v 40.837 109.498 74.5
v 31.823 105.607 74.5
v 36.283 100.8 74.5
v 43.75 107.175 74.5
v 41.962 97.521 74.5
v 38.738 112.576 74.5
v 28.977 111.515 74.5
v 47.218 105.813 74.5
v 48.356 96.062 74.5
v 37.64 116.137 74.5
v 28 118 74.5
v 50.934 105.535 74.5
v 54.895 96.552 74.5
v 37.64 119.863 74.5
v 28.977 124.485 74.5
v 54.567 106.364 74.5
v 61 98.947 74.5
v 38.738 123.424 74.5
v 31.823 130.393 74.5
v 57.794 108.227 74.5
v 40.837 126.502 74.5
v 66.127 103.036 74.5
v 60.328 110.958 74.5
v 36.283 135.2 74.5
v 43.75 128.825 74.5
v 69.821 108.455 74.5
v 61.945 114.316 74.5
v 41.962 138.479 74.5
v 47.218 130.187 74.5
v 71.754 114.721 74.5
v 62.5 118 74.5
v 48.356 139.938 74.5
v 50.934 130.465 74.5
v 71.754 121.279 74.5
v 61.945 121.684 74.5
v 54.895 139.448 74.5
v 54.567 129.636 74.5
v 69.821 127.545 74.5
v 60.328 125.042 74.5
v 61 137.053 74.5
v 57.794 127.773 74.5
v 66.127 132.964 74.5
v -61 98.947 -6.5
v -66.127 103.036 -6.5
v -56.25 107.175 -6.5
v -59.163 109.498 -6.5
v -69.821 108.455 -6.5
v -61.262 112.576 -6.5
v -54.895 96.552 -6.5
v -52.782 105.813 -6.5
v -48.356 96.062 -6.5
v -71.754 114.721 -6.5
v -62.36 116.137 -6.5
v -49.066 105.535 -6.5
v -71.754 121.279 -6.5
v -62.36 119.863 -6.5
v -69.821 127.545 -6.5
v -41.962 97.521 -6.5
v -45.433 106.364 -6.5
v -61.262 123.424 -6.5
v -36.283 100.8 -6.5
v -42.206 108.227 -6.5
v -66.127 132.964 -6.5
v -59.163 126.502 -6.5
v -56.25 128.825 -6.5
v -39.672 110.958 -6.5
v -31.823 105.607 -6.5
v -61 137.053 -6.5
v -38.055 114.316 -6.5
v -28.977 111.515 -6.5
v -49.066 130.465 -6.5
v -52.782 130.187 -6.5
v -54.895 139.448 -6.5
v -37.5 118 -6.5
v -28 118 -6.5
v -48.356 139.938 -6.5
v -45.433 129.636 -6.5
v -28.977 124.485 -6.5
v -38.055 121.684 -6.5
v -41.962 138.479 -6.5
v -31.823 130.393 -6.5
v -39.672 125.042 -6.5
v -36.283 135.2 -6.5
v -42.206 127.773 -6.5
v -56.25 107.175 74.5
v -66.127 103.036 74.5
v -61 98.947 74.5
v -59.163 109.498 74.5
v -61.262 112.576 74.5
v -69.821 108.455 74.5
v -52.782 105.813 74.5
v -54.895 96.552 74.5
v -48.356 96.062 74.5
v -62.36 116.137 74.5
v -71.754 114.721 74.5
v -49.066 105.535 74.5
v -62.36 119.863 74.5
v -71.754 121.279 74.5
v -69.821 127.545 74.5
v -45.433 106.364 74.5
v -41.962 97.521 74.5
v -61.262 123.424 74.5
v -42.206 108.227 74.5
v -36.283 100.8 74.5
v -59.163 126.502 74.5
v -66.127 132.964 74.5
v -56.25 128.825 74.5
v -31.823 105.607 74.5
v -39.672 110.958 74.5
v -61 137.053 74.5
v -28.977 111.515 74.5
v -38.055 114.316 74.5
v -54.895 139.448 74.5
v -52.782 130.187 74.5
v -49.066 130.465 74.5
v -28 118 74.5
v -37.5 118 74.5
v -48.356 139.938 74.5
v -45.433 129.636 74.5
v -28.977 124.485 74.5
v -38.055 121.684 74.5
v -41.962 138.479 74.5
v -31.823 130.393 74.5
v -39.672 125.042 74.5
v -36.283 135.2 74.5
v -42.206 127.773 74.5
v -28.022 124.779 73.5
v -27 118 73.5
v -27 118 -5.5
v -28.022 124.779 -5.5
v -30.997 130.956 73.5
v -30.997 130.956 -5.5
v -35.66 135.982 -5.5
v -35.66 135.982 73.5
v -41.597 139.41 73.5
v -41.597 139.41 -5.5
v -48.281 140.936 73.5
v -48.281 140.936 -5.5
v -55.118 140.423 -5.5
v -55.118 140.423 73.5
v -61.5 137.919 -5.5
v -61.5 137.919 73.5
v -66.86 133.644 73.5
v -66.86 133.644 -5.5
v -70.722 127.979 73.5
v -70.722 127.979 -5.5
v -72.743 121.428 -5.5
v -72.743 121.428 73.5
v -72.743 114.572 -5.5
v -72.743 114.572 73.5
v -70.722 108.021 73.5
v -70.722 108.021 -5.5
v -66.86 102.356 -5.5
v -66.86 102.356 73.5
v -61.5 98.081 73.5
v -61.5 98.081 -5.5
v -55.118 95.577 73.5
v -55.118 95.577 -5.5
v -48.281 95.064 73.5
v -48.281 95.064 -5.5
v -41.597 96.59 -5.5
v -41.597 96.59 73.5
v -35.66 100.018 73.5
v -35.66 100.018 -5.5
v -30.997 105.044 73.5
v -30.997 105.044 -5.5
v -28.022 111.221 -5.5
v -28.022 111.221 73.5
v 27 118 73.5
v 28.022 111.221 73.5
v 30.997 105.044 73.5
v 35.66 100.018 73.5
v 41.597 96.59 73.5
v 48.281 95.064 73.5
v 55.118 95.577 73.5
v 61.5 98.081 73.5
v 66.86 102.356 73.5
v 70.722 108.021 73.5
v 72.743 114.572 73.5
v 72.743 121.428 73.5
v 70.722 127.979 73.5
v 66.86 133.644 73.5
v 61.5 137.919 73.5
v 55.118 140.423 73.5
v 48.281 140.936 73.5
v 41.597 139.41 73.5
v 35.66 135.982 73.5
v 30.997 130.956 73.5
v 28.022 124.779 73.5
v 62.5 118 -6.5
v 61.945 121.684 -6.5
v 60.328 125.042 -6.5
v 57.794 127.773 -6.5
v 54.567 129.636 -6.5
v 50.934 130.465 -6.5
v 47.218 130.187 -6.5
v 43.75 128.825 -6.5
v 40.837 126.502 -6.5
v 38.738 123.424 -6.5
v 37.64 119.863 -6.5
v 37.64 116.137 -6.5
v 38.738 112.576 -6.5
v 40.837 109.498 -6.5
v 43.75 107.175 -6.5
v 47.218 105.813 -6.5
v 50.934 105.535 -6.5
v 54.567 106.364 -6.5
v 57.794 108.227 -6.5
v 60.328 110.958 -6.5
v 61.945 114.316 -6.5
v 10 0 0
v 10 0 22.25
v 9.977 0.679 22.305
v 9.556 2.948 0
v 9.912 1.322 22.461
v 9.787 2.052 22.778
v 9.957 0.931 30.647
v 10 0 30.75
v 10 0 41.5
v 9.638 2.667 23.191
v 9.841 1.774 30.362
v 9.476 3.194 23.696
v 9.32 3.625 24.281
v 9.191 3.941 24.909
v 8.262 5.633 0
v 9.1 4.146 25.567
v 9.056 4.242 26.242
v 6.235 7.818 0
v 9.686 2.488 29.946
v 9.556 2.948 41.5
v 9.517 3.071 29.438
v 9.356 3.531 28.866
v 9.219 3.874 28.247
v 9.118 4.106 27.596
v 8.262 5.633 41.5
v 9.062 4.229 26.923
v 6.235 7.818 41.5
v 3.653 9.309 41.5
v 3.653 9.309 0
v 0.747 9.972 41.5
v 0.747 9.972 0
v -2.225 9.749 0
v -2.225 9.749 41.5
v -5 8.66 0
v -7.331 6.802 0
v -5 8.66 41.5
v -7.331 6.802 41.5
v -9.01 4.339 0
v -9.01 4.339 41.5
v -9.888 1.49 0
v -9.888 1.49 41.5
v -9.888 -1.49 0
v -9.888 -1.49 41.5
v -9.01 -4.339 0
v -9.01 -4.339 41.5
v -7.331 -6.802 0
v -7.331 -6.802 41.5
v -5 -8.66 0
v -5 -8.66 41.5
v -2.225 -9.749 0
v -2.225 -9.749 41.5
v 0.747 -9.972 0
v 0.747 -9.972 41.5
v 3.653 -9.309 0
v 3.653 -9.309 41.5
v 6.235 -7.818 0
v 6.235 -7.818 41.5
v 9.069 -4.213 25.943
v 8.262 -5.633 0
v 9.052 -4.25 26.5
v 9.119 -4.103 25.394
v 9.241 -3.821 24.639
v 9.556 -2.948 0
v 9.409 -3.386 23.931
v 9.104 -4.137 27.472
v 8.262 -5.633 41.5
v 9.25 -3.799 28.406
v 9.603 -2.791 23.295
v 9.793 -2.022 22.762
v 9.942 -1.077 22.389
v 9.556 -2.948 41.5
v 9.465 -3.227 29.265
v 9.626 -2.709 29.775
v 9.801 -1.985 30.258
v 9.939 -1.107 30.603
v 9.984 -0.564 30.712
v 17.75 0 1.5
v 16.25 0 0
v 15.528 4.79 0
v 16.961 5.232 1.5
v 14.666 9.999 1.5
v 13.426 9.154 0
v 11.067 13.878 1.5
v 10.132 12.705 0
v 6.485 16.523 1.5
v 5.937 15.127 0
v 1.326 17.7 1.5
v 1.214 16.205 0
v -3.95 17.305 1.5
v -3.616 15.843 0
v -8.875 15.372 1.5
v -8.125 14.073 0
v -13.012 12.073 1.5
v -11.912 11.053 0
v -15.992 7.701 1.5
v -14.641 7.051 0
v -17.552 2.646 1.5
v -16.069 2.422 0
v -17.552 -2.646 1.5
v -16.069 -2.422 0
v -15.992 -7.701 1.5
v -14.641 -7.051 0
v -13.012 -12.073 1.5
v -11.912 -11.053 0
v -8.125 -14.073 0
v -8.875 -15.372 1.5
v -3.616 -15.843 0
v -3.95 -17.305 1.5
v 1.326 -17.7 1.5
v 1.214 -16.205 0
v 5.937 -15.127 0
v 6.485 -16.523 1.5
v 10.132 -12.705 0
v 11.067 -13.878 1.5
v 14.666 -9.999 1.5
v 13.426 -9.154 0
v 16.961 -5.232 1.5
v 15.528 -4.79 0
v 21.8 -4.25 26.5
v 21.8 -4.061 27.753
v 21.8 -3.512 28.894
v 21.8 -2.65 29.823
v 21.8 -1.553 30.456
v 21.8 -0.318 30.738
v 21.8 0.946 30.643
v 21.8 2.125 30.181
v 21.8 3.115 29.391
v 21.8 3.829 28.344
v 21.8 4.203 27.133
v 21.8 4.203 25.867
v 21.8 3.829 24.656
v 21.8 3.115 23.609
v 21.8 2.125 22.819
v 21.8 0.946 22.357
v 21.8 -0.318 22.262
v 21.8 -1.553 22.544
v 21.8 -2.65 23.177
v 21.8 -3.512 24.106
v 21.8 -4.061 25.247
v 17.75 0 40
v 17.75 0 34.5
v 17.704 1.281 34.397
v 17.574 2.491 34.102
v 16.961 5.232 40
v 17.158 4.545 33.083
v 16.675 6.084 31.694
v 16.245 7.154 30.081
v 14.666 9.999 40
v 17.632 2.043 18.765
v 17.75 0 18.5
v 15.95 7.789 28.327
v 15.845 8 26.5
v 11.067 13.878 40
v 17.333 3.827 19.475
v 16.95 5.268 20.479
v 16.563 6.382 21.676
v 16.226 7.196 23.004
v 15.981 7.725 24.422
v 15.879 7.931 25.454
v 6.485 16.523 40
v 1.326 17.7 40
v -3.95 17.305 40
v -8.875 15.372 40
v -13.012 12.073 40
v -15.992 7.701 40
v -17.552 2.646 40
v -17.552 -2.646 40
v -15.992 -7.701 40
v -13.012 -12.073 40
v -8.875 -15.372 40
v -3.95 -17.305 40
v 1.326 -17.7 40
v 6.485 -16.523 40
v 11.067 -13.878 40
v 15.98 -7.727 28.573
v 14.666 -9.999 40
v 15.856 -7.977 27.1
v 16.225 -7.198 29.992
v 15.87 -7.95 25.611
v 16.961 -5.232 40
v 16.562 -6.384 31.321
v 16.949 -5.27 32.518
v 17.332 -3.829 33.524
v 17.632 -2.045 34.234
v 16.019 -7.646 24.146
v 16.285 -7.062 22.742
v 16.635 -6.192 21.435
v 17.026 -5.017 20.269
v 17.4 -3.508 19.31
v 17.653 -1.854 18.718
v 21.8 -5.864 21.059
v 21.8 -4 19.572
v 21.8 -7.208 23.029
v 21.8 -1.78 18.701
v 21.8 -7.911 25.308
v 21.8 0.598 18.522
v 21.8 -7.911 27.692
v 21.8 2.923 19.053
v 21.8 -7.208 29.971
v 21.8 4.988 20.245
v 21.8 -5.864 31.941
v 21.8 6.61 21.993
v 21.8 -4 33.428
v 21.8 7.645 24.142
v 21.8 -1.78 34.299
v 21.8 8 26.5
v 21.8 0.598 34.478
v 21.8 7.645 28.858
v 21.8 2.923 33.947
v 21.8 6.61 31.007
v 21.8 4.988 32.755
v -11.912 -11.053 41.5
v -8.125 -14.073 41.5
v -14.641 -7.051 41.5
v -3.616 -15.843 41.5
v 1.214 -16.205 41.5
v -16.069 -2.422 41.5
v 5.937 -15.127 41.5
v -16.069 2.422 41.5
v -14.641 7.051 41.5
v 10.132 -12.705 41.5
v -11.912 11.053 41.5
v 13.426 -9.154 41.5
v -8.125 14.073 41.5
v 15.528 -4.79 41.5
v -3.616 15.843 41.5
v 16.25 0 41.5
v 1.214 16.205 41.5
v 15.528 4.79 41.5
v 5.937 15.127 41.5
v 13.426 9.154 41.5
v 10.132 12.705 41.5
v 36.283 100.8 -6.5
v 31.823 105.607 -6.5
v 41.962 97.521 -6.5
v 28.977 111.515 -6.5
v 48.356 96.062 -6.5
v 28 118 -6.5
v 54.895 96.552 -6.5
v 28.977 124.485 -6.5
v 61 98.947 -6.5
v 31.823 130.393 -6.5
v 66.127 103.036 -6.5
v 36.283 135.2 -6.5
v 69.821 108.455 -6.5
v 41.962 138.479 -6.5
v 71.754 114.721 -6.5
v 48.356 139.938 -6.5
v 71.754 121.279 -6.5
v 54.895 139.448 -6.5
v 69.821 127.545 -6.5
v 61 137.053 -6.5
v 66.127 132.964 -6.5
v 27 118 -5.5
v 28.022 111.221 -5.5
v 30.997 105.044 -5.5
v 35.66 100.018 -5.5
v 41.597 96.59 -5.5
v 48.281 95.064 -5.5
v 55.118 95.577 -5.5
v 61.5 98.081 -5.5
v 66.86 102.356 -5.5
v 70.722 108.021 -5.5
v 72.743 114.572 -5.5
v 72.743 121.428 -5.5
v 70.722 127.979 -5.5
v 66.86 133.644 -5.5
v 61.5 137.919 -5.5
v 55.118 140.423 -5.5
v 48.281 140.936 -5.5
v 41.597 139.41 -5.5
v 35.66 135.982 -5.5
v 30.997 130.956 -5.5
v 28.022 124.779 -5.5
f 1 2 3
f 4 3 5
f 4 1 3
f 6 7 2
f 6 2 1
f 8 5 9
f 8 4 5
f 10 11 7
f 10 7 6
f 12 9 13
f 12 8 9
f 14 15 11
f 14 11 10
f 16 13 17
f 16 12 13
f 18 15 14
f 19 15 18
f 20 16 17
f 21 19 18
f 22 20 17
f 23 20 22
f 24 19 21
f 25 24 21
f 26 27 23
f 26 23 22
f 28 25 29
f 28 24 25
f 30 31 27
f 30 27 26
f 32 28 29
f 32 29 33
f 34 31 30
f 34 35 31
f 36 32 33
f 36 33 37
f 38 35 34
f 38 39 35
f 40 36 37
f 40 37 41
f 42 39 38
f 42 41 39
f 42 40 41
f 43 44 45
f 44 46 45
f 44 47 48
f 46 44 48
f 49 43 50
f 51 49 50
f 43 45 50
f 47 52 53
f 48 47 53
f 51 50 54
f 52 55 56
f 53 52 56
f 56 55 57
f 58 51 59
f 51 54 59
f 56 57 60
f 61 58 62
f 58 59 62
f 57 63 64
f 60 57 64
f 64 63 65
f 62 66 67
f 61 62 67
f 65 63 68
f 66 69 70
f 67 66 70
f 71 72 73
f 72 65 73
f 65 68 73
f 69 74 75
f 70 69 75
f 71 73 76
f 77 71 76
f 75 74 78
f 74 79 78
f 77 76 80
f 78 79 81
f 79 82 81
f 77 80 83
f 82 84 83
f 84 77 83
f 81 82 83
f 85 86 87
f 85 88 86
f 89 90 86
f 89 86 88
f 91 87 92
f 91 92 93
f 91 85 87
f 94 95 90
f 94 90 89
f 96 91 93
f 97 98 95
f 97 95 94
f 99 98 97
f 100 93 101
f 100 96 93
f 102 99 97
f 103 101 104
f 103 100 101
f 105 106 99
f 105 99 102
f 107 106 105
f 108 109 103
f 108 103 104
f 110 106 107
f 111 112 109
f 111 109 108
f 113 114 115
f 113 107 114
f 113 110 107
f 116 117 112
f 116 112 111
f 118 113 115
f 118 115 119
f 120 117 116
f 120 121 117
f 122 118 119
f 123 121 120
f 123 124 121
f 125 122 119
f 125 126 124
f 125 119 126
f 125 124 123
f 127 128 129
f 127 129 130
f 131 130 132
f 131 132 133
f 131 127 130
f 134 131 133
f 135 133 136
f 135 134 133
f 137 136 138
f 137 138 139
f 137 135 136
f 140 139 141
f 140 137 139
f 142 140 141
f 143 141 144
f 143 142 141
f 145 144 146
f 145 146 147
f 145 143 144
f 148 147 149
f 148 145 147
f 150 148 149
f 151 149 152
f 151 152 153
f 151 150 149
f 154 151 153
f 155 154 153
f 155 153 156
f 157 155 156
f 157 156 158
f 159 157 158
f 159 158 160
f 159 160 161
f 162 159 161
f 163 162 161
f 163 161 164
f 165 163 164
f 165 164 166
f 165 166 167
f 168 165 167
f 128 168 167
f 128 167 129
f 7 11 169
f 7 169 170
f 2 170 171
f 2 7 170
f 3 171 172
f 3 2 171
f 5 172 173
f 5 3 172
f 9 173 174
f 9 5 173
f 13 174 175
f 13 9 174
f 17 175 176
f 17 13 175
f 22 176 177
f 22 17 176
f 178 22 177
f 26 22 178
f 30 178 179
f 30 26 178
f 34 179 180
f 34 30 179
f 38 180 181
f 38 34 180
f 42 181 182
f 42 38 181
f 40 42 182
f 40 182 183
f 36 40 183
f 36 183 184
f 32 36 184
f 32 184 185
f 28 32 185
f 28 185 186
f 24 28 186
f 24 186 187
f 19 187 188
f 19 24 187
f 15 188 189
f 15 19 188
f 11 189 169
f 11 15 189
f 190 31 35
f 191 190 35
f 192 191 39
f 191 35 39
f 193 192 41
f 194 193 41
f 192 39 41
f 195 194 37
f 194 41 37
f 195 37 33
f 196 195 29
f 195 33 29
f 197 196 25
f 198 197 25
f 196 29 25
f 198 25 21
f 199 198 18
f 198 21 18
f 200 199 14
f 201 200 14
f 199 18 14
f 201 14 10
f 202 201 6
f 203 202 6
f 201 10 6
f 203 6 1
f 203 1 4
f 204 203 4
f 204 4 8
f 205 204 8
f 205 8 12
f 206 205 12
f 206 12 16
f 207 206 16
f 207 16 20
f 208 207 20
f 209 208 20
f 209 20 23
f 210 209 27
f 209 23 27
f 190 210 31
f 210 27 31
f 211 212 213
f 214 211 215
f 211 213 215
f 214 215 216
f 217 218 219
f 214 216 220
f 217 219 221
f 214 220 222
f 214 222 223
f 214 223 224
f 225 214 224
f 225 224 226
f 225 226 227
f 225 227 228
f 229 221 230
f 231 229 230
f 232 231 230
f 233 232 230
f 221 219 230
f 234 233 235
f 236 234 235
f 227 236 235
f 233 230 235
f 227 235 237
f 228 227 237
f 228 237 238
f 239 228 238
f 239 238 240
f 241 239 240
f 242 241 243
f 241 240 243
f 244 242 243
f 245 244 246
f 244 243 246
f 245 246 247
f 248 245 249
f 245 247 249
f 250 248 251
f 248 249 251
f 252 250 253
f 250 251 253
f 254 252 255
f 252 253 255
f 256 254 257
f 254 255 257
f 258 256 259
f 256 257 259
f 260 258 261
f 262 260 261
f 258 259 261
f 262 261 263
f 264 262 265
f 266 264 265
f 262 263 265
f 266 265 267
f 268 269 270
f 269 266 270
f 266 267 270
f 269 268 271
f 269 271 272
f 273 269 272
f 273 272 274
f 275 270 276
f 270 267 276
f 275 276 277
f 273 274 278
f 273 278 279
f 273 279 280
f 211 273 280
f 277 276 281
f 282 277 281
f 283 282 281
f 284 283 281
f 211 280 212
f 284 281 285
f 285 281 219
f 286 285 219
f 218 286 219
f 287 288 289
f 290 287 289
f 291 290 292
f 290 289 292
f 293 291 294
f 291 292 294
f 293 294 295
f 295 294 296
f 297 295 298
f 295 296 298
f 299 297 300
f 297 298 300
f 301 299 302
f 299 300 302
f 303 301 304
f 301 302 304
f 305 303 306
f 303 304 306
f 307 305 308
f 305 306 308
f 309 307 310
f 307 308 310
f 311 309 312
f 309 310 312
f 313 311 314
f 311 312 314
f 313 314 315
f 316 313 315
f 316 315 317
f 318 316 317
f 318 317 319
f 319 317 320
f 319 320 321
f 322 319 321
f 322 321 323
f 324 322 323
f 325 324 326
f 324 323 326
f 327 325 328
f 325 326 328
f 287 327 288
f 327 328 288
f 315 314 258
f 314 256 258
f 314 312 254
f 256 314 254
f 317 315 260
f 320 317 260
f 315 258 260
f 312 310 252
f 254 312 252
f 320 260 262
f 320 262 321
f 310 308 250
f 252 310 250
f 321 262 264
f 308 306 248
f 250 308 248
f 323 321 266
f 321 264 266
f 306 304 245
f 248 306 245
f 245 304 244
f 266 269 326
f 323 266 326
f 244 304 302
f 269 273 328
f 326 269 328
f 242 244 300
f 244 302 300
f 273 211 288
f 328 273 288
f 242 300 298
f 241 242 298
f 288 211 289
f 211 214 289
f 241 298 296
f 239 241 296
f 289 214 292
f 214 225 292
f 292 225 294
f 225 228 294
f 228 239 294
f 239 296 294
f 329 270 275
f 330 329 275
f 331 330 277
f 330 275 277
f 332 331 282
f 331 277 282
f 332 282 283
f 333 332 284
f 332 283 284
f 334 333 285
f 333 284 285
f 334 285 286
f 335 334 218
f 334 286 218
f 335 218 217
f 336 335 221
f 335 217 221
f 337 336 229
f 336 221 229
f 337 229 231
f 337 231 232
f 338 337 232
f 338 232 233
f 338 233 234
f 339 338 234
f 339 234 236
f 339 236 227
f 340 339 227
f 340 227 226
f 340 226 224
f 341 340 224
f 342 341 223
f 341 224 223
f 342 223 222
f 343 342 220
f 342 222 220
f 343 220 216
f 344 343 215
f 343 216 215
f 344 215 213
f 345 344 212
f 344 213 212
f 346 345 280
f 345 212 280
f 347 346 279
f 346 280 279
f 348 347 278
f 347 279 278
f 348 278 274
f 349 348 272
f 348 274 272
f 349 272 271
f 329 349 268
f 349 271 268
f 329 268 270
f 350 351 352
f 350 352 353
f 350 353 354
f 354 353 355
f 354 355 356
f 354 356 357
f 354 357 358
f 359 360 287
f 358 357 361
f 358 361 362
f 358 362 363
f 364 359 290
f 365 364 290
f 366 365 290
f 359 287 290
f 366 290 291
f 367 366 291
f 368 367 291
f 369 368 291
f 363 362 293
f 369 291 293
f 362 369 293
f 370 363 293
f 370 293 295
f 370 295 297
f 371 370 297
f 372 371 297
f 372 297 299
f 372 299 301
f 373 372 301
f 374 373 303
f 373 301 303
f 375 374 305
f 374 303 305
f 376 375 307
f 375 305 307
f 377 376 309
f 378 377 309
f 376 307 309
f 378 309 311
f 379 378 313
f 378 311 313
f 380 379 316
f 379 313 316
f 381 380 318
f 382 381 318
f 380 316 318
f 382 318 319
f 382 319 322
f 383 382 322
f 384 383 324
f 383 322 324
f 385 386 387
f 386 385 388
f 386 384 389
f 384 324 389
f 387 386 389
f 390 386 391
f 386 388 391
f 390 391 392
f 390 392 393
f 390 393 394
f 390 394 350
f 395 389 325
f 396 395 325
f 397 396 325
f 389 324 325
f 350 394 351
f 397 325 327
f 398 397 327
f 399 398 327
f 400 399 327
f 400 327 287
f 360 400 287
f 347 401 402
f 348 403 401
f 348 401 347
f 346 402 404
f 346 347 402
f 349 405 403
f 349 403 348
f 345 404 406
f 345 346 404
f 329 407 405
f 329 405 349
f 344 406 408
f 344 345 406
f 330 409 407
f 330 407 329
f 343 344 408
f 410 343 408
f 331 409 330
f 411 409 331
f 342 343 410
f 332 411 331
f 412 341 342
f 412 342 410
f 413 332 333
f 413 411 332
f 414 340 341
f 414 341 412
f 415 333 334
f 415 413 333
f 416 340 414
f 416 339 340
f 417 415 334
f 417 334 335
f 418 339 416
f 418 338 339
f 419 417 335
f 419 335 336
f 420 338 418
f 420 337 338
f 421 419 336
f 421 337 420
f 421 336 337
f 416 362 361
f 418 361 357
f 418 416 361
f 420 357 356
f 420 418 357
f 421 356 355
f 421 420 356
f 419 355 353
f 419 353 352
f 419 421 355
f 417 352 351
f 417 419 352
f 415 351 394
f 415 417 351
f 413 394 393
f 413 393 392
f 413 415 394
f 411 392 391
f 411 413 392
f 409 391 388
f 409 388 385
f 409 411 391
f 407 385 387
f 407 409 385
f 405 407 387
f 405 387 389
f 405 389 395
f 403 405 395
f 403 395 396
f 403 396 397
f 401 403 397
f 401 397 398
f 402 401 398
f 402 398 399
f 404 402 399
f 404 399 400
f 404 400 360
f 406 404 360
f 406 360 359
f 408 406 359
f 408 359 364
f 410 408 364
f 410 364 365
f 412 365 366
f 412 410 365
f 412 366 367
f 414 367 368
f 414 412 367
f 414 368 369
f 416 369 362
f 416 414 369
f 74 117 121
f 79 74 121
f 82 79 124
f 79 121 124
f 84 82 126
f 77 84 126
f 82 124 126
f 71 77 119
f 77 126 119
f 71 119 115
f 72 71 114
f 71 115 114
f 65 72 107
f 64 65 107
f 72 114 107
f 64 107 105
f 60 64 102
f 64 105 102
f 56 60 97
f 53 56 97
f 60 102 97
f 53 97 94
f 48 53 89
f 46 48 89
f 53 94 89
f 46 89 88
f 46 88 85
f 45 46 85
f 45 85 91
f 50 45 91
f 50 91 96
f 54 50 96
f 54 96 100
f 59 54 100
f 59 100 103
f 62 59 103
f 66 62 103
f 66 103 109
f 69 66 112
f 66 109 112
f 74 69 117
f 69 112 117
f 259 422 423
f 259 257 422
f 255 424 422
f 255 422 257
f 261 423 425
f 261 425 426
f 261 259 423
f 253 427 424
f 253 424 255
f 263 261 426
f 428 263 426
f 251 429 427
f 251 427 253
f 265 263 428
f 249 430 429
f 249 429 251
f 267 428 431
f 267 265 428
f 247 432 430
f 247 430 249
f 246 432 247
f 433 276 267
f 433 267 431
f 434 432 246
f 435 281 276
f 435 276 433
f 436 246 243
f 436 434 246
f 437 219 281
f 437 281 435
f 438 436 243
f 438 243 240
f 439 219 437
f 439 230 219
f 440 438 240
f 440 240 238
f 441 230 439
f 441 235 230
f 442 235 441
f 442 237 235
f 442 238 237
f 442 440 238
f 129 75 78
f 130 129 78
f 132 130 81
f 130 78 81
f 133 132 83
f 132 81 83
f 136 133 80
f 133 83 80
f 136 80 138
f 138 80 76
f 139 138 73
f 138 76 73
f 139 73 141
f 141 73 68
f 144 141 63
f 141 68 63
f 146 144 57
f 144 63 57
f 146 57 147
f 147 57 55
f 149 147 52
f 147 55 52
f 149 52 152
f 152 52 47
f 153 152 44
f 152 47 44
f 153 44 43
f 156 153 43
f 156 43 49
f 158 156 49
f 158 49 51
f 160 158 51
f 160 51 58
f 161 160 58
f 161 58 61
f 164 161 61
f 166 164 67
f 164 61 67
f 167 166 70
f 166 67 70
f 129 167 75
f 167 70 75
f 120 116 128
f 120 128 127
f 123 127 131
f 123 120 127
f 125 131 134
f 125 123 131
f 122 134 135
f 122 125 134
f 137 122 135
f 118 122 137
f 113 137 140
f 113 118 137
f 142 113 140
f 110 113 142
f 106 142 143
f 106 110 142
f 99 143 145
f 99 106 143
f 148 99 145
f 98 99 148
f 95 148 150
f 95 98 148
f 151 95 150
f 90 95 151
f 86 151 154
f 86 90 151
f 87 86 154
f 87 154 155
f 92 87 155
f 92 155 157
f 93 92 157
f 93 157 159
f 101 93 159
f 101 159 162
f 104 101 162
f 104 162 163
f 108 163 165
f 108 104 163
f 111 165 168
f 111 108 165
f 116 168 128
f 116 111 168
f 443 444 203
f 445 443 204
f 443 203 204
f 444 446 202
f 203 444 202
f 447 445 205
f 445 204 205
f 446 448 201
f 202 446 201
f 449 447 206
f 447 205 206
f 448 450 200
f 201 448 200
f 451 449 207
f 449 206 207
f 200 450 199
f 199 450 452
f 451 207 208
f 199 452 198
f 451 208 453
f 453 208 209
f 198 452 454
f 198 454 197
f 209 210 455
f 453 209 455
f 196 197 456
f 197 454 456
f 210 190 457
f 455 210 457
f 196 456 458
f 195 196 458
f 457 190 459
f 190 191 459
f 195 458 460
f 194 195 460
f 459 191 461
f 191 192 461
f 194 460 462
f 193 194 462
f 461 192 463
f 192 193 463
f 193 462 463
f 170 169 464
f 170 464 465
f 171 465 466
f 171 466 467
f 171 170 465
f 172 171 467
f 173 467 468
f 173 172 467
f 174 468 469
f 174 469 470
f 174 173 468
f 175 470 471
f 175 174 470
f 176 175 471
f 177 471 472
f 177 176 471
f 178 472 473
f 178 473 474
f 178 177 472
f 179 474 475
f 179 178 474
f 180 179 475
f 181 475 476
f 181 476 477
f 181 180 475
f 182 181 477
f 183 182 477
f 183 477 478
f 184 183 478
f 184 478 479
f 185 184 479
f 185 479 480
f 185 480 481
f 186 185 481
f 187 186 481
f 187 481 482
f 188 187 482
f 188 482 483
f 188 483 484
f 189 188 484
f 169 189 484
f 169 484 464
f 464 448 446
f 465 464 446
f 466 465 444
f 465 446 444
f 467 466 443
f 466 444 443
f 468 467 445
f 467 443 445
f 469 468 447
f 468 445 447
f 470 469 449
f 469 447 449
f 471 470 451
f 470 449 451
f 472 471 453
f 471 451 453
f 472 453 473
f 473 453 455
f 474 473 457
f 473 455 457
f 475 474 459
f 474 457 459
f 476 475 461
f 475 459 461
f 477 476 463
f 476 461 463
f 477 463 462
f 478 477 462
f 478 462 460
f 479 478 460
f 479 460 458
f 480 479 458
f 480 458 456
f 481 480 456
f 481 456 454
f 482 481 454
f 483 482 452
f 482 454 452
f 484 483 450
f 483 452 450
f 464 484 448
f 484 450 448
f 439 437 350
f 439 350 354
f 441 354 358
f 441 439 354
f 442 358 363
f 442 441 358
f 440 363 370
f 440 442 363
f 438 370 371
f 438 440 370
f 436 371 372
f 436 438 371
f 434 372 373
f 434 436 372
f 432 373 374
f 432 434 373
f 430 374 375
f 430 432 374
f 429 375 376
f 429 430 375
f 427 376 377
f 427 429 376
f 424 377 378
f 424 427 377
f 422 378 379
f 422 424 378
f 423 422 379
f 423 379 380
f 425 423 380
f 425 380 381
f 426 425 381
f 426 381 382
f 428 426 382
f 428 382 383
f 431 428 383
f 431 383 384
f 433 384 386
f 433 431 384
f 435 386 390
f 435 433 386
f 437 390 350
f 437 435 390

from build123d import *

# Parameters (mm, degrees)
F0_R           = 17.75
F1_DEPTH       = 41.5
F2_R           = 10
F3_DEPTH       = 42
F4_SIZE        = 1.5
F9_R           = 8
F10_DEPTH      = 7.2
F12_D          = 8.5
F12_DEPTH      = 16.5
F12_TIP        = 2.5536576309
F13_R          = 23
F14_DEPTH      = 74.5
F14_DEPTH_BACK = 6.5
F15_SIZE       = 1
F15_2_SIZE     = 1
F16_R          = 12.5
F17_R          = 12.5
F18_DEPTH      = 81
F19_DEPTH      = 81


with BuildPart() as f1:
    # F0 (on Top) → F1 (new body)
    with BuildSketch(Plane.XY):
        Circle(F0_R)
    extrude(amount=F1_DEPTH)

    # F2 (on face) → F3 (cut)
    with BuildSketch(Plane.XY.offset(41.5)):
        Circle(F2_R)
    extrude(amount=-F3_DEPTH, mode=Mode.SUBTRACT)

    # F4
    f4_edges = [f1.edges().sort_by_distance(p)[0] for p in [
        (-17.75, 0, 41.5),
        (-17.75, 0, 0),
    ]]
    chamfer(f4_edges, length=F4_SIZE)

    # F9 (on offset) → F10 (join)
    with BuildSketch(Plane.YZ.offset(21.8)):
        with Locations((0, 26.5000239015)):
            Circle(F9_R)
    extrude(amount=-F10_DEPTH)

    # F12
    with Locations(Plane.YZ.offset(21.8)):
        with Locations((0, 26.5000239015)):
            Hole(F12_D / 2, depth=F12_DEPTH)
            with Locations((0, 0, -(F12_DEPTH + F12_TIP / 2))):  # 118° drill point
                Cone(0, F12_D / 2, F12_TIP, mode=Mode.SUBTRACT)

    # F17 (on face) → F19 (cut)
    with BuildSketch(Plane.XY.offset(74.5)):
        with Locations((50, 118)):
            Circle(F17_R)
    extrude(amount=-F19_DEPTH, mode=Mode.SUBTRACT)


with BuildPart() as f14:
    # F13 (on Top) → F14 (new body, two sides)
    with BuildSketch(Plane.XY) as f14_sk:
        with Locations((-50, 118)):
            Circle(F13_R)
    extrude(amount=F14_DEPTH)
    extrude(f14_sk.sketch, amount=-F14_DEPTH_BACK)

    # F15
    f15_edges = [f14.edges().sort_by_distance(p)[0] for p in [
        (-73, 118, 74.5),
        (-73, 118, -6.5),
    ]]
    chamfer(f15_edges, length=F15_SIZE)


with BuildPart() as f14b:
    # F13 (on Top) → F14, piece 2 (new body, two sides)
    with BuildSketch(Plane.XY) as f14_2_sk:
        with BuildLine():
            ThreePointArc((73, 118), (50, 141), (27, 118))
            ThreePointArc((27, 118), (50, 95), (73, 118))
        make_face()
    extrude(amount=F14_DEPTH)
    extrude(f14_2_sk.sketch, amount=-F14_DEPTH_BACK)

    # F15#2
    f15_2_edges = [f14b.edges().sort_by_distance(p)[0] for p in [
        (73, 118, 74.5),
        (73, 118, -6.5),
    ]]
    chamfer(f15_2_edges, length=F15_2_SIZE)


with BuildPart() as f18_tool:
    # F16 (on face) + F17 (on face) → F18 (new body)
    with BuildSketch(Plane.XY.offset(74.5)):
        with Locations((-50, 118)):
            Circle(F16_R)
    with BuildSketch(Plane.XY.offset(74.5)):
        with Locations((50, 118)):
            Circle(F17_R)
    extrude(amount=-F18_DEPTH)


with BuildPart() as f14_1:
    add(f14.part)

    # F18: cut by f18_tool
    add(f18_tool.part, mode=Mode.SUBTRACT)


with BuildPart() as f14b_1:
    add(f14b.part)

    # F18: cut by f18_tool
    add(f18_tool.part, mode=Mode.SUBTRACT)


solid = Compound([f1.part, f14_1.part, f14b_1.part])
